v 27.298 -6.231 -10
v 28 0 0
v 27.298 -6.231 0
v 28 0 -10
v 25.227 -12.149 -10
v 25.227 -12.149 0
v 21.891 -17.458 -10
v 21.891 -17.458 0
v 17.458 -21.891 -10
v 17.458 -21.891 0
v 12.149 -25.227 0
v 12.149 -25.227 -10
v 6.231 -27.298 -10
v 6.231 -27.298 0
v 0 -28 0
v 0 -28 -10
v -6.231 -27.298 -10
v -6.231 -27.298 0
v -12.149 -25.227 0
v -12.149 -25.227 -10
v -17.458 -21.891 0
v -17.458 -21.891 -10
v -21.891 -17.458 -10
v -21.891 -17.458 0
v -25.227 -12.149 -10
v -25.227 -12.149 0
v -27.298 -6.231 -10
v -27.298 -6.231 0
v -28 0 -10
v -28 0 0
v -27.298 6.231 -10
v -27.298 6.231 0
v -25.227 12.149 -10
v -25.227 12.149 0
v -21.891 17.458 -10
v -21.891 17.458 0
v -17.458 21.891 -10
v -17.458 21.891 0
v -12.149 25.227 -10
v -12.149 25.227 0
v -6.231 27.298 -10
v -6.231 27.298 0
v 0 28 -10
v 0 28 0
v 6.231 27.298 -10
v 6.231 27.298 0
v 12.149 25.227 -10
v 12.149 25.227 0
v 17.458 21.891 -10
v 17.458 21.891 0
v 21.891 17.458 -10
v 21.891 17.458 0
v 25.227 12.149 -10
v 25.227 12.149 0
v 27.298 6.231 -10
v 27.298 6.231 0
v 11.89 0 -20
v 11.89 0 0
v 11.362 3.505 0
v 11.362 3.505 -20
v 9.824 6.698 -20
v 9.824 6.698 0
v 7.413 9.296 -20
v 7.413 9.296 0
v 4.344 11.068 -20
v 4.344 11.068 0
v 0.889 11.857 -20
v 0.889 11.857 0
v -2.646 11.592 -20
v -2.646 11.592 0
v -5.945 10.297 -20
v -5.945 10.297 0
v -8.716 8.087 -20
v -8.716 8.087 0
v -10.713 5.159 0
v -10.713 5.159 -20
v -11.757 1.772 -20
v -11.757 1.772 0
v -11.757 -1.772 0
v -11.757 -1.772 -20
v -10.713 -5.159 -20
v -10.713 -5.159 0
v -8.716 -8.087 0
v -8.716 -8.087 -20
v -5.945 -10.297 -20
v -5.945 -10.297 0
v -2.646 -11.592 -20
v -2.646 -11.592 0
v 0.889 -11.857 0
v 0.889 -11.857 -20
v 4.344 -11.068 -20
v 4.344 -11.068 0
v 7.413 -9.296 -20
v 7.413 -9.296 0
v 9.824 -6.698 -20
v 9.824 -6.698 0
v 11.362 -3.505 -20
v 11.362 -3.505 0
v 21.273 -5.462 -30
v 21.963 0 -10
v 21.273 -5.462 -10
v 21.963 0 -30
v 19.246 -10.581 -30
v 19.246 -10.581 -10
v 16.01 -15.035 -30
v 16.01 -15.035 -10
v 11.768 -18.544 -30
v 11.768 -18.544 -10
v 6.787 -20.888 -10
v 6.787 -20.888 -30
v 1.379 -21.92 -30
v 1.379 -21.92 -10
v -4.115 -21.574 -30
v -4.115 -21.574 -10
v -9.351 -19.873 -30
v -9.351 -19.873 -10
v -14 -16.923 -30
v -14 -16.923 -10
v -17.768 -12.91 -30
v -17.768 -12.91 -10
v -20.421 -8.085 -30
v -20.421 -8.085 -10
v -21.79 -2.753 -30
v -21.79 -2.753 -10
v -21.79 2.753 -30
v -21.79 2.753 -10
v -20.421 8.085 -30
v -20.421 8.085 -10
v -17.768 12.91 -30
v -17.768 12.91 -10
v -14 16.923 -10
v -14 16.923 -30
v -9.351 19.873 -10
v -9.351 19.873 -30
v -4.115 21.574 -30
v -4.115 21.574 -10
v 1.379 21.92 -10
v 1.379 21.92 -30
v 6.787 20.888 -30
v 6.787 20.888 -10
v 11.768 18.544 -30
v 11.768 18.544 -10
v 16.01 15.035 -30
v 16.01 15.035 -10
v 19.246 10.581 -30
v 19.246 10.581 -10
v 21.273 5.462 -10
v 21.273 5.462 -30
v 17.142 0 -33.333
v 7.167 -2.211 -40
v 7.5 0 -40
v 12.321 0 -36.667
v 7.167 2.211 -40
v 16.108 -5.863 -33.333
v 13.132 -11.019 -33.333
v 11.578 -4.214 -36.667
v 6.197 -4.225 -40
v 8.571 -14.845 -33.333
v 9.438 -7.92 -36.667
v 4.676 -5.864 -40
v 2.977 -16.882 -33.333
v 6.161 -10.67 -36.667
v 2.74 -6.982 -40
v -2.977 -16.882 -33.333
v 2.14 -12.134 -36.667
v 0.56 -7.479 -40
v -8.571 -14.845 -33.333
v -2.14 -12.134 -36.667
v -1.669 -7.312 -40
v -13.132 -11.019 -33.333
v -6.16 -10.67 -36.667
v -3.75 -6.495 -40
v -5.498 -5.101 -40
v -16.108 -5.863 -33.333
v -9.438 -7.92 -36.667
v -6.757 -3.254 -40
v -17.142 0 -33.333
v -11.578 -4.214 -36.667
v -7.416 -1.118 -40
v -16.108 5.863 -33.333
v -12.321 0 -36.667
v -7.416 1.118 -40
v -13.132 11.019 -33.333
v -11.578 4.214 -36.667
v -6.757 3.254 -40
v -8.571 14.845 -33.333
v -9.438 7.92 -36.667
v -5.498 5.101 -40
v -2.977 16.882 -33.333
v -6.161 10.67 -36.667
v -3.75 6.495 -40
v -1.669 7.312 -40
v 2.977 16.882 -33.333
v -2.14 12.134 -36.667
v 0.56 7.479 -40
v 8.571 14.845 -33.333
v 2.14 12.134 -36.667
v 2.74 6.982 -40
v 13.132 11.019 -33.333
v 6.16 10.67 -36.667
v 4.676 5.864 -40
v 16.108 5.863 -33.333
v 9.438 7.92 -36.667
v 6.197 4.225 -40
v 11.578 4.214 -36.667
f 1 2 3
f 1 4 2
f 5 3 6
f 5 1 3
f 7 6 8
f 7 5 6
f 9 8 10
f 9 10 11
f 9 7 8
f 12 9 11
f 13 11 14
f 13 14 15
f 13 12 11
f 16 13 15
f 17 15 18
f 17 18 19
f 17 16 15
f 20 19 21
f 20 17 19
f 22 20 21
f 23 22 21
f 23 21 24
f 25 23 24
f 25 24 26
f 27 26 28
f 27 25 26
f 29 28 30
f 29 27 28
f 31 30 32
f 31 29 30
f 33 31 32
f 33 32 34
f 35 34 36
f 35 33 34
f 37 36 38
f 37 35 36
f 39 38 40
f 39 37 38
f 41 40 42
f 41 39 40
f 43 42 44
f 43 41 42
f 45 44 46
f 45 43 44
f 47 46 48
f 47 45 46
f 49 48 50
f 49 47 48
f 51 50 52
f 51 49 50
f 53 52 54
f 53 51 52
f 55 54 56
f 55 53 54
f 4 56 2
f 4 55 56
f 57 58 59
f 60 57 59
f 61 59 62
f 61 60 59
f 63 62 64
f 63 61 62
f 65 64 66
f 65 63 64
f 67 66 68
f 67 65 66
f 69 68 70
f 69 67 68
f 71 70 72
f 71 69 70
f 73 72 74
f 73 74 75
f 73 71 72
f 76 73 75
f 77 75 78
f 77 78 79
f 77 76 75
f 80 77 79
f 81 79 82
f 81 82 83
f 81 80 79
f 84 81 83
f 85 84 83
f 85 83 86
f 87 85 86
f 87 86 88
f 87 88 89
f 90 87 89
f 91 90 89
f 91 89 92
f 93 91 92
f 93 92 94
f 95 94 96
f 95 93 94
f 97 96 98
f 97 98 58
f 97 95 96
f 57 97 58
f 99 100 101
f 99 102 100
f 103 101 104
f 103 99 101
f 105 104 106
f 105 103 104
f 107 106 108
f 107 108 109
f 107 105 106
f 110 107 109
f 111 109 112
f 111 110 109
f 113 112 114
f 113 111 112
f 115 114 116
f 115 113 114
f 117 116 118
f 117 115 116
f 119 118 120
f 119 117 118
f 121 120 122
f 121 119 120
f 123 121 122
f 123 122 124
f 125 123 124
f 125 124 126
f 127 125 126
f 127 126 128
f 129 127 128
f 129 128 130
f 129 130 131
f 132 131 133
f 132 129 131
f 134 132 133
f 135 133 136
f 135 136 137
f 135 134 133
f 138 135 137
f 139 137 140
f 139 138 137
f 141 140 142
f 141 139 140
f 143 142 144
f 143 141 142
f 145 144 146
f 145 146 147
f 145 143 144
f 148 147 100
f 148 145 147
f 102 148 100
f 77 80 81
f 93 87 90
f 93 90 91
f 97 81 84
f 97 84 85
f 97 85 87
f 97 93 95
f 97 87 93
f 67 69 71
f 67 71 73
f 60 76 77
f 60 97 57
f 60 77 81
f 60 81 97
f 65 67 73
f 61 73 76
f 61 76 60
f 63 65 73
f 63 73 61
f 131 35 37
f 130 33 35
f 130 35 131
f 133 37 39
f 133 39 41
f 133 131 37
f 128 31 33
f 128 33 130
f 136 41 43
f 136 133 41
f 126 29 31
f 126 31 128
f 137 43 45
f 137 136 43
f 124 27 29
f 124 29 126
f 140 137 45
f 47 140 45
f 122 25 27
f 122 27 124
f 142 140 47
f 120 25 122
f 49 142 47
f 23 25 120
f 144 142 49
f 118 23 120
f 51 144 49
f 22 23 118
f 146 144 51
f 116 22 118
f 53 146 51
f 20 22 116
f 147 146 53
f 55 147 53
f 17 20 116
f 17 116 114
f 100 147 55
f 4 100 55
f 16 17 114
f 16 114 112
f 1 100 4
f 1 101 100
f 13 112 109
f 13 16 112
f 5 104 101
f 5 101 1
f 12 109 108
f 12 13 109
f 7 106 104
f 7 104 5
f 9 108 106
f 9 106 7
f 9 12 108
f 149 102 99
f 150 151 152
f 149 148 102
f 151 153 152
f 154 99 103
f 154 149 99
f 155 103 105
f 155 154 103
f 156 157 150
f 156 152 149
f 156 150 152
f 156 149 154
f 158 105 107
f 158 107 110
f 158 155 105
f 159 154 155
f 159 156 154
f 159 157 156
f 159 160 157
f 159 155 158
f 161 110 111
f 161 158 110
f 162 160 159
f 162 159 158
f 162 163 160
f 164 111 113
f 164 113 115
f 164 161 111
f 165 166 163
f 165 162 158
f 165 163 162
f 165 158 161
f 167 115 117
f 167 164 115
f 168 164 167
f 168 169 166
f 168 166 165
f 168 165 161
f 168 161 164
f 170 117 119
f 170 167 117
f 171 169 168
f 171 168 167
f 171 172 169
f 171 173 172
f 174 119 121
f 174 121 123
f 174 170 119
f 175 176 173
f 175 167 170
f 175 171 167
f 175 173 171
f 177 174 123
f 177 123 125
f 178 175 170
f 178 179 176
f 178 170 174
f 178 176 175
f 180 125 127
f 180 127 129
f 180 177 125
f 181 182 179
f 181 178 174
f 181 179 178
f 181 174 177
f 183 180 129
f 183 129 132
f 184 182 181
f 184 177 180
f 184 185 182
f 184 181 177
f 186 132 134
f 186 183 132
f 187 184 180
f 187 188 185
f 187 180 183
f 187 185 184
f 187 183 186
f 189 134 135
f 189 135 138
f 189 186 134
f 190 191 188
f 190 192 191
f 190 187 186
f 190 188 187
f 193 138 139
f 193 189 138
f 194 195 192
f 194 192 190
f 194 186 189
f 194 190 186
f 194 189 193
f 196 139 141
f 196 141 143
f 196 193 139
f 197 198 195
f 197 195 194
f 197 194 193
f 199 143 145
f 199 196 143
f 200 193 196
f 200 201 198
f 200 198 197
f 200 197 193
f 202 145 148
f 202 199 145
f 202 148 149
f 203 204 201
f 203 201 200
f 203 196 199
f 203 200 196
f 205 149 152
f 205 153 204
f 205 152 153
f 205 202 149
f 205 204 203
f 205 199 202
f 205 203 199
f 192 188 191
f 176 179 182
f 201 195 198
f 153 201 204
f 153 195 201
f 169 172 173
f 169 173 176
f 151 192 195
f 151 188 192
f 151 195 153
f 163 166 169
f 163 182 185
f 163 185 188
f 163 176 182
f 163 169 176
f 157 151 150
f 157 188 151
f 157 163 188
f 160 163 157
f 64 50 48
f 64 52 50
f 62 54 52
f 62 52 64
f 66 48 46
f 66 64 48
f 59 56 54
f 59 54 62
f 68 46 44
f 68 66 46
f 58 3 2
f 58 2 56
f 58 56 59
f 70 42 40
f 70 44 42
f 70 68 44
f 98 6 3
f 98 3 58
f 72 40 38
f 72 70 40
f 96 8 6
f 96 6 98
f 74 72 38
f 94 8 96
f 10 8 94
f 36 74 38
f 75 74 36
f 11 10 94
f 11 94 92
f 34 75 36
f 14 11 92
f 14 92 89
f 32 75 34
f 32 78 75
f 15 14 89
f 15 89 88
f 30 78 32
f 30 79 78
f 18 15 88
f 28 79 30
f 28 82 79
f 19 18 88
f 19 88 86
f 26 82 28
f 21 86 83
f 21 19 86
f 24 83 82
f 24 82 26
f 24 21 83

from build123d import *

# Parameters (mm, degrees)
TALADROAVANZADO1_START     = -20
TALADROAVANZADO1_OUTLINE_R = 11.89
TALADROAVANZADO1_DEPTH     = 20


# Read off the part's stored shape, not the designer's step: TaladroAvanzado1
with BuildPart() as part:
    # Croquis1 → Revolución1 (revolve)
    with BuildSketch(Plane(origin=(0, 0, 0), x_dir=(0, 0, -1), z_dir=(1, 0, 0)), mode=Mode.PRIVATE) as revoluci_n1_sk:
        Polygon((0, 0), (0, 28), (10, 28), (10, 21.963), (30, 21.963), (40, 7.5), (40, 0), align=None)
    revolve(revoluci_n1_sk.sketch.rotate(Axis((0, 0, 8.757704884), (0, 0, -1)), 90), axis=Axis((0, 0, 8.757704884), (0, 0, -1)))

    # TaladroAvanzado1 outline → TaladroAvanzado1 (cut)
    with BuildSketch(Plane.XY.offset(TALADROAVANZADO1_START)):
        Circle(TALADROAVANZADO1_OUTLINE_R)
    extrude(amount=TALADROAVANZADO1_DEPTH, mode=Mode.SUBTRACT)


solid = part.part
